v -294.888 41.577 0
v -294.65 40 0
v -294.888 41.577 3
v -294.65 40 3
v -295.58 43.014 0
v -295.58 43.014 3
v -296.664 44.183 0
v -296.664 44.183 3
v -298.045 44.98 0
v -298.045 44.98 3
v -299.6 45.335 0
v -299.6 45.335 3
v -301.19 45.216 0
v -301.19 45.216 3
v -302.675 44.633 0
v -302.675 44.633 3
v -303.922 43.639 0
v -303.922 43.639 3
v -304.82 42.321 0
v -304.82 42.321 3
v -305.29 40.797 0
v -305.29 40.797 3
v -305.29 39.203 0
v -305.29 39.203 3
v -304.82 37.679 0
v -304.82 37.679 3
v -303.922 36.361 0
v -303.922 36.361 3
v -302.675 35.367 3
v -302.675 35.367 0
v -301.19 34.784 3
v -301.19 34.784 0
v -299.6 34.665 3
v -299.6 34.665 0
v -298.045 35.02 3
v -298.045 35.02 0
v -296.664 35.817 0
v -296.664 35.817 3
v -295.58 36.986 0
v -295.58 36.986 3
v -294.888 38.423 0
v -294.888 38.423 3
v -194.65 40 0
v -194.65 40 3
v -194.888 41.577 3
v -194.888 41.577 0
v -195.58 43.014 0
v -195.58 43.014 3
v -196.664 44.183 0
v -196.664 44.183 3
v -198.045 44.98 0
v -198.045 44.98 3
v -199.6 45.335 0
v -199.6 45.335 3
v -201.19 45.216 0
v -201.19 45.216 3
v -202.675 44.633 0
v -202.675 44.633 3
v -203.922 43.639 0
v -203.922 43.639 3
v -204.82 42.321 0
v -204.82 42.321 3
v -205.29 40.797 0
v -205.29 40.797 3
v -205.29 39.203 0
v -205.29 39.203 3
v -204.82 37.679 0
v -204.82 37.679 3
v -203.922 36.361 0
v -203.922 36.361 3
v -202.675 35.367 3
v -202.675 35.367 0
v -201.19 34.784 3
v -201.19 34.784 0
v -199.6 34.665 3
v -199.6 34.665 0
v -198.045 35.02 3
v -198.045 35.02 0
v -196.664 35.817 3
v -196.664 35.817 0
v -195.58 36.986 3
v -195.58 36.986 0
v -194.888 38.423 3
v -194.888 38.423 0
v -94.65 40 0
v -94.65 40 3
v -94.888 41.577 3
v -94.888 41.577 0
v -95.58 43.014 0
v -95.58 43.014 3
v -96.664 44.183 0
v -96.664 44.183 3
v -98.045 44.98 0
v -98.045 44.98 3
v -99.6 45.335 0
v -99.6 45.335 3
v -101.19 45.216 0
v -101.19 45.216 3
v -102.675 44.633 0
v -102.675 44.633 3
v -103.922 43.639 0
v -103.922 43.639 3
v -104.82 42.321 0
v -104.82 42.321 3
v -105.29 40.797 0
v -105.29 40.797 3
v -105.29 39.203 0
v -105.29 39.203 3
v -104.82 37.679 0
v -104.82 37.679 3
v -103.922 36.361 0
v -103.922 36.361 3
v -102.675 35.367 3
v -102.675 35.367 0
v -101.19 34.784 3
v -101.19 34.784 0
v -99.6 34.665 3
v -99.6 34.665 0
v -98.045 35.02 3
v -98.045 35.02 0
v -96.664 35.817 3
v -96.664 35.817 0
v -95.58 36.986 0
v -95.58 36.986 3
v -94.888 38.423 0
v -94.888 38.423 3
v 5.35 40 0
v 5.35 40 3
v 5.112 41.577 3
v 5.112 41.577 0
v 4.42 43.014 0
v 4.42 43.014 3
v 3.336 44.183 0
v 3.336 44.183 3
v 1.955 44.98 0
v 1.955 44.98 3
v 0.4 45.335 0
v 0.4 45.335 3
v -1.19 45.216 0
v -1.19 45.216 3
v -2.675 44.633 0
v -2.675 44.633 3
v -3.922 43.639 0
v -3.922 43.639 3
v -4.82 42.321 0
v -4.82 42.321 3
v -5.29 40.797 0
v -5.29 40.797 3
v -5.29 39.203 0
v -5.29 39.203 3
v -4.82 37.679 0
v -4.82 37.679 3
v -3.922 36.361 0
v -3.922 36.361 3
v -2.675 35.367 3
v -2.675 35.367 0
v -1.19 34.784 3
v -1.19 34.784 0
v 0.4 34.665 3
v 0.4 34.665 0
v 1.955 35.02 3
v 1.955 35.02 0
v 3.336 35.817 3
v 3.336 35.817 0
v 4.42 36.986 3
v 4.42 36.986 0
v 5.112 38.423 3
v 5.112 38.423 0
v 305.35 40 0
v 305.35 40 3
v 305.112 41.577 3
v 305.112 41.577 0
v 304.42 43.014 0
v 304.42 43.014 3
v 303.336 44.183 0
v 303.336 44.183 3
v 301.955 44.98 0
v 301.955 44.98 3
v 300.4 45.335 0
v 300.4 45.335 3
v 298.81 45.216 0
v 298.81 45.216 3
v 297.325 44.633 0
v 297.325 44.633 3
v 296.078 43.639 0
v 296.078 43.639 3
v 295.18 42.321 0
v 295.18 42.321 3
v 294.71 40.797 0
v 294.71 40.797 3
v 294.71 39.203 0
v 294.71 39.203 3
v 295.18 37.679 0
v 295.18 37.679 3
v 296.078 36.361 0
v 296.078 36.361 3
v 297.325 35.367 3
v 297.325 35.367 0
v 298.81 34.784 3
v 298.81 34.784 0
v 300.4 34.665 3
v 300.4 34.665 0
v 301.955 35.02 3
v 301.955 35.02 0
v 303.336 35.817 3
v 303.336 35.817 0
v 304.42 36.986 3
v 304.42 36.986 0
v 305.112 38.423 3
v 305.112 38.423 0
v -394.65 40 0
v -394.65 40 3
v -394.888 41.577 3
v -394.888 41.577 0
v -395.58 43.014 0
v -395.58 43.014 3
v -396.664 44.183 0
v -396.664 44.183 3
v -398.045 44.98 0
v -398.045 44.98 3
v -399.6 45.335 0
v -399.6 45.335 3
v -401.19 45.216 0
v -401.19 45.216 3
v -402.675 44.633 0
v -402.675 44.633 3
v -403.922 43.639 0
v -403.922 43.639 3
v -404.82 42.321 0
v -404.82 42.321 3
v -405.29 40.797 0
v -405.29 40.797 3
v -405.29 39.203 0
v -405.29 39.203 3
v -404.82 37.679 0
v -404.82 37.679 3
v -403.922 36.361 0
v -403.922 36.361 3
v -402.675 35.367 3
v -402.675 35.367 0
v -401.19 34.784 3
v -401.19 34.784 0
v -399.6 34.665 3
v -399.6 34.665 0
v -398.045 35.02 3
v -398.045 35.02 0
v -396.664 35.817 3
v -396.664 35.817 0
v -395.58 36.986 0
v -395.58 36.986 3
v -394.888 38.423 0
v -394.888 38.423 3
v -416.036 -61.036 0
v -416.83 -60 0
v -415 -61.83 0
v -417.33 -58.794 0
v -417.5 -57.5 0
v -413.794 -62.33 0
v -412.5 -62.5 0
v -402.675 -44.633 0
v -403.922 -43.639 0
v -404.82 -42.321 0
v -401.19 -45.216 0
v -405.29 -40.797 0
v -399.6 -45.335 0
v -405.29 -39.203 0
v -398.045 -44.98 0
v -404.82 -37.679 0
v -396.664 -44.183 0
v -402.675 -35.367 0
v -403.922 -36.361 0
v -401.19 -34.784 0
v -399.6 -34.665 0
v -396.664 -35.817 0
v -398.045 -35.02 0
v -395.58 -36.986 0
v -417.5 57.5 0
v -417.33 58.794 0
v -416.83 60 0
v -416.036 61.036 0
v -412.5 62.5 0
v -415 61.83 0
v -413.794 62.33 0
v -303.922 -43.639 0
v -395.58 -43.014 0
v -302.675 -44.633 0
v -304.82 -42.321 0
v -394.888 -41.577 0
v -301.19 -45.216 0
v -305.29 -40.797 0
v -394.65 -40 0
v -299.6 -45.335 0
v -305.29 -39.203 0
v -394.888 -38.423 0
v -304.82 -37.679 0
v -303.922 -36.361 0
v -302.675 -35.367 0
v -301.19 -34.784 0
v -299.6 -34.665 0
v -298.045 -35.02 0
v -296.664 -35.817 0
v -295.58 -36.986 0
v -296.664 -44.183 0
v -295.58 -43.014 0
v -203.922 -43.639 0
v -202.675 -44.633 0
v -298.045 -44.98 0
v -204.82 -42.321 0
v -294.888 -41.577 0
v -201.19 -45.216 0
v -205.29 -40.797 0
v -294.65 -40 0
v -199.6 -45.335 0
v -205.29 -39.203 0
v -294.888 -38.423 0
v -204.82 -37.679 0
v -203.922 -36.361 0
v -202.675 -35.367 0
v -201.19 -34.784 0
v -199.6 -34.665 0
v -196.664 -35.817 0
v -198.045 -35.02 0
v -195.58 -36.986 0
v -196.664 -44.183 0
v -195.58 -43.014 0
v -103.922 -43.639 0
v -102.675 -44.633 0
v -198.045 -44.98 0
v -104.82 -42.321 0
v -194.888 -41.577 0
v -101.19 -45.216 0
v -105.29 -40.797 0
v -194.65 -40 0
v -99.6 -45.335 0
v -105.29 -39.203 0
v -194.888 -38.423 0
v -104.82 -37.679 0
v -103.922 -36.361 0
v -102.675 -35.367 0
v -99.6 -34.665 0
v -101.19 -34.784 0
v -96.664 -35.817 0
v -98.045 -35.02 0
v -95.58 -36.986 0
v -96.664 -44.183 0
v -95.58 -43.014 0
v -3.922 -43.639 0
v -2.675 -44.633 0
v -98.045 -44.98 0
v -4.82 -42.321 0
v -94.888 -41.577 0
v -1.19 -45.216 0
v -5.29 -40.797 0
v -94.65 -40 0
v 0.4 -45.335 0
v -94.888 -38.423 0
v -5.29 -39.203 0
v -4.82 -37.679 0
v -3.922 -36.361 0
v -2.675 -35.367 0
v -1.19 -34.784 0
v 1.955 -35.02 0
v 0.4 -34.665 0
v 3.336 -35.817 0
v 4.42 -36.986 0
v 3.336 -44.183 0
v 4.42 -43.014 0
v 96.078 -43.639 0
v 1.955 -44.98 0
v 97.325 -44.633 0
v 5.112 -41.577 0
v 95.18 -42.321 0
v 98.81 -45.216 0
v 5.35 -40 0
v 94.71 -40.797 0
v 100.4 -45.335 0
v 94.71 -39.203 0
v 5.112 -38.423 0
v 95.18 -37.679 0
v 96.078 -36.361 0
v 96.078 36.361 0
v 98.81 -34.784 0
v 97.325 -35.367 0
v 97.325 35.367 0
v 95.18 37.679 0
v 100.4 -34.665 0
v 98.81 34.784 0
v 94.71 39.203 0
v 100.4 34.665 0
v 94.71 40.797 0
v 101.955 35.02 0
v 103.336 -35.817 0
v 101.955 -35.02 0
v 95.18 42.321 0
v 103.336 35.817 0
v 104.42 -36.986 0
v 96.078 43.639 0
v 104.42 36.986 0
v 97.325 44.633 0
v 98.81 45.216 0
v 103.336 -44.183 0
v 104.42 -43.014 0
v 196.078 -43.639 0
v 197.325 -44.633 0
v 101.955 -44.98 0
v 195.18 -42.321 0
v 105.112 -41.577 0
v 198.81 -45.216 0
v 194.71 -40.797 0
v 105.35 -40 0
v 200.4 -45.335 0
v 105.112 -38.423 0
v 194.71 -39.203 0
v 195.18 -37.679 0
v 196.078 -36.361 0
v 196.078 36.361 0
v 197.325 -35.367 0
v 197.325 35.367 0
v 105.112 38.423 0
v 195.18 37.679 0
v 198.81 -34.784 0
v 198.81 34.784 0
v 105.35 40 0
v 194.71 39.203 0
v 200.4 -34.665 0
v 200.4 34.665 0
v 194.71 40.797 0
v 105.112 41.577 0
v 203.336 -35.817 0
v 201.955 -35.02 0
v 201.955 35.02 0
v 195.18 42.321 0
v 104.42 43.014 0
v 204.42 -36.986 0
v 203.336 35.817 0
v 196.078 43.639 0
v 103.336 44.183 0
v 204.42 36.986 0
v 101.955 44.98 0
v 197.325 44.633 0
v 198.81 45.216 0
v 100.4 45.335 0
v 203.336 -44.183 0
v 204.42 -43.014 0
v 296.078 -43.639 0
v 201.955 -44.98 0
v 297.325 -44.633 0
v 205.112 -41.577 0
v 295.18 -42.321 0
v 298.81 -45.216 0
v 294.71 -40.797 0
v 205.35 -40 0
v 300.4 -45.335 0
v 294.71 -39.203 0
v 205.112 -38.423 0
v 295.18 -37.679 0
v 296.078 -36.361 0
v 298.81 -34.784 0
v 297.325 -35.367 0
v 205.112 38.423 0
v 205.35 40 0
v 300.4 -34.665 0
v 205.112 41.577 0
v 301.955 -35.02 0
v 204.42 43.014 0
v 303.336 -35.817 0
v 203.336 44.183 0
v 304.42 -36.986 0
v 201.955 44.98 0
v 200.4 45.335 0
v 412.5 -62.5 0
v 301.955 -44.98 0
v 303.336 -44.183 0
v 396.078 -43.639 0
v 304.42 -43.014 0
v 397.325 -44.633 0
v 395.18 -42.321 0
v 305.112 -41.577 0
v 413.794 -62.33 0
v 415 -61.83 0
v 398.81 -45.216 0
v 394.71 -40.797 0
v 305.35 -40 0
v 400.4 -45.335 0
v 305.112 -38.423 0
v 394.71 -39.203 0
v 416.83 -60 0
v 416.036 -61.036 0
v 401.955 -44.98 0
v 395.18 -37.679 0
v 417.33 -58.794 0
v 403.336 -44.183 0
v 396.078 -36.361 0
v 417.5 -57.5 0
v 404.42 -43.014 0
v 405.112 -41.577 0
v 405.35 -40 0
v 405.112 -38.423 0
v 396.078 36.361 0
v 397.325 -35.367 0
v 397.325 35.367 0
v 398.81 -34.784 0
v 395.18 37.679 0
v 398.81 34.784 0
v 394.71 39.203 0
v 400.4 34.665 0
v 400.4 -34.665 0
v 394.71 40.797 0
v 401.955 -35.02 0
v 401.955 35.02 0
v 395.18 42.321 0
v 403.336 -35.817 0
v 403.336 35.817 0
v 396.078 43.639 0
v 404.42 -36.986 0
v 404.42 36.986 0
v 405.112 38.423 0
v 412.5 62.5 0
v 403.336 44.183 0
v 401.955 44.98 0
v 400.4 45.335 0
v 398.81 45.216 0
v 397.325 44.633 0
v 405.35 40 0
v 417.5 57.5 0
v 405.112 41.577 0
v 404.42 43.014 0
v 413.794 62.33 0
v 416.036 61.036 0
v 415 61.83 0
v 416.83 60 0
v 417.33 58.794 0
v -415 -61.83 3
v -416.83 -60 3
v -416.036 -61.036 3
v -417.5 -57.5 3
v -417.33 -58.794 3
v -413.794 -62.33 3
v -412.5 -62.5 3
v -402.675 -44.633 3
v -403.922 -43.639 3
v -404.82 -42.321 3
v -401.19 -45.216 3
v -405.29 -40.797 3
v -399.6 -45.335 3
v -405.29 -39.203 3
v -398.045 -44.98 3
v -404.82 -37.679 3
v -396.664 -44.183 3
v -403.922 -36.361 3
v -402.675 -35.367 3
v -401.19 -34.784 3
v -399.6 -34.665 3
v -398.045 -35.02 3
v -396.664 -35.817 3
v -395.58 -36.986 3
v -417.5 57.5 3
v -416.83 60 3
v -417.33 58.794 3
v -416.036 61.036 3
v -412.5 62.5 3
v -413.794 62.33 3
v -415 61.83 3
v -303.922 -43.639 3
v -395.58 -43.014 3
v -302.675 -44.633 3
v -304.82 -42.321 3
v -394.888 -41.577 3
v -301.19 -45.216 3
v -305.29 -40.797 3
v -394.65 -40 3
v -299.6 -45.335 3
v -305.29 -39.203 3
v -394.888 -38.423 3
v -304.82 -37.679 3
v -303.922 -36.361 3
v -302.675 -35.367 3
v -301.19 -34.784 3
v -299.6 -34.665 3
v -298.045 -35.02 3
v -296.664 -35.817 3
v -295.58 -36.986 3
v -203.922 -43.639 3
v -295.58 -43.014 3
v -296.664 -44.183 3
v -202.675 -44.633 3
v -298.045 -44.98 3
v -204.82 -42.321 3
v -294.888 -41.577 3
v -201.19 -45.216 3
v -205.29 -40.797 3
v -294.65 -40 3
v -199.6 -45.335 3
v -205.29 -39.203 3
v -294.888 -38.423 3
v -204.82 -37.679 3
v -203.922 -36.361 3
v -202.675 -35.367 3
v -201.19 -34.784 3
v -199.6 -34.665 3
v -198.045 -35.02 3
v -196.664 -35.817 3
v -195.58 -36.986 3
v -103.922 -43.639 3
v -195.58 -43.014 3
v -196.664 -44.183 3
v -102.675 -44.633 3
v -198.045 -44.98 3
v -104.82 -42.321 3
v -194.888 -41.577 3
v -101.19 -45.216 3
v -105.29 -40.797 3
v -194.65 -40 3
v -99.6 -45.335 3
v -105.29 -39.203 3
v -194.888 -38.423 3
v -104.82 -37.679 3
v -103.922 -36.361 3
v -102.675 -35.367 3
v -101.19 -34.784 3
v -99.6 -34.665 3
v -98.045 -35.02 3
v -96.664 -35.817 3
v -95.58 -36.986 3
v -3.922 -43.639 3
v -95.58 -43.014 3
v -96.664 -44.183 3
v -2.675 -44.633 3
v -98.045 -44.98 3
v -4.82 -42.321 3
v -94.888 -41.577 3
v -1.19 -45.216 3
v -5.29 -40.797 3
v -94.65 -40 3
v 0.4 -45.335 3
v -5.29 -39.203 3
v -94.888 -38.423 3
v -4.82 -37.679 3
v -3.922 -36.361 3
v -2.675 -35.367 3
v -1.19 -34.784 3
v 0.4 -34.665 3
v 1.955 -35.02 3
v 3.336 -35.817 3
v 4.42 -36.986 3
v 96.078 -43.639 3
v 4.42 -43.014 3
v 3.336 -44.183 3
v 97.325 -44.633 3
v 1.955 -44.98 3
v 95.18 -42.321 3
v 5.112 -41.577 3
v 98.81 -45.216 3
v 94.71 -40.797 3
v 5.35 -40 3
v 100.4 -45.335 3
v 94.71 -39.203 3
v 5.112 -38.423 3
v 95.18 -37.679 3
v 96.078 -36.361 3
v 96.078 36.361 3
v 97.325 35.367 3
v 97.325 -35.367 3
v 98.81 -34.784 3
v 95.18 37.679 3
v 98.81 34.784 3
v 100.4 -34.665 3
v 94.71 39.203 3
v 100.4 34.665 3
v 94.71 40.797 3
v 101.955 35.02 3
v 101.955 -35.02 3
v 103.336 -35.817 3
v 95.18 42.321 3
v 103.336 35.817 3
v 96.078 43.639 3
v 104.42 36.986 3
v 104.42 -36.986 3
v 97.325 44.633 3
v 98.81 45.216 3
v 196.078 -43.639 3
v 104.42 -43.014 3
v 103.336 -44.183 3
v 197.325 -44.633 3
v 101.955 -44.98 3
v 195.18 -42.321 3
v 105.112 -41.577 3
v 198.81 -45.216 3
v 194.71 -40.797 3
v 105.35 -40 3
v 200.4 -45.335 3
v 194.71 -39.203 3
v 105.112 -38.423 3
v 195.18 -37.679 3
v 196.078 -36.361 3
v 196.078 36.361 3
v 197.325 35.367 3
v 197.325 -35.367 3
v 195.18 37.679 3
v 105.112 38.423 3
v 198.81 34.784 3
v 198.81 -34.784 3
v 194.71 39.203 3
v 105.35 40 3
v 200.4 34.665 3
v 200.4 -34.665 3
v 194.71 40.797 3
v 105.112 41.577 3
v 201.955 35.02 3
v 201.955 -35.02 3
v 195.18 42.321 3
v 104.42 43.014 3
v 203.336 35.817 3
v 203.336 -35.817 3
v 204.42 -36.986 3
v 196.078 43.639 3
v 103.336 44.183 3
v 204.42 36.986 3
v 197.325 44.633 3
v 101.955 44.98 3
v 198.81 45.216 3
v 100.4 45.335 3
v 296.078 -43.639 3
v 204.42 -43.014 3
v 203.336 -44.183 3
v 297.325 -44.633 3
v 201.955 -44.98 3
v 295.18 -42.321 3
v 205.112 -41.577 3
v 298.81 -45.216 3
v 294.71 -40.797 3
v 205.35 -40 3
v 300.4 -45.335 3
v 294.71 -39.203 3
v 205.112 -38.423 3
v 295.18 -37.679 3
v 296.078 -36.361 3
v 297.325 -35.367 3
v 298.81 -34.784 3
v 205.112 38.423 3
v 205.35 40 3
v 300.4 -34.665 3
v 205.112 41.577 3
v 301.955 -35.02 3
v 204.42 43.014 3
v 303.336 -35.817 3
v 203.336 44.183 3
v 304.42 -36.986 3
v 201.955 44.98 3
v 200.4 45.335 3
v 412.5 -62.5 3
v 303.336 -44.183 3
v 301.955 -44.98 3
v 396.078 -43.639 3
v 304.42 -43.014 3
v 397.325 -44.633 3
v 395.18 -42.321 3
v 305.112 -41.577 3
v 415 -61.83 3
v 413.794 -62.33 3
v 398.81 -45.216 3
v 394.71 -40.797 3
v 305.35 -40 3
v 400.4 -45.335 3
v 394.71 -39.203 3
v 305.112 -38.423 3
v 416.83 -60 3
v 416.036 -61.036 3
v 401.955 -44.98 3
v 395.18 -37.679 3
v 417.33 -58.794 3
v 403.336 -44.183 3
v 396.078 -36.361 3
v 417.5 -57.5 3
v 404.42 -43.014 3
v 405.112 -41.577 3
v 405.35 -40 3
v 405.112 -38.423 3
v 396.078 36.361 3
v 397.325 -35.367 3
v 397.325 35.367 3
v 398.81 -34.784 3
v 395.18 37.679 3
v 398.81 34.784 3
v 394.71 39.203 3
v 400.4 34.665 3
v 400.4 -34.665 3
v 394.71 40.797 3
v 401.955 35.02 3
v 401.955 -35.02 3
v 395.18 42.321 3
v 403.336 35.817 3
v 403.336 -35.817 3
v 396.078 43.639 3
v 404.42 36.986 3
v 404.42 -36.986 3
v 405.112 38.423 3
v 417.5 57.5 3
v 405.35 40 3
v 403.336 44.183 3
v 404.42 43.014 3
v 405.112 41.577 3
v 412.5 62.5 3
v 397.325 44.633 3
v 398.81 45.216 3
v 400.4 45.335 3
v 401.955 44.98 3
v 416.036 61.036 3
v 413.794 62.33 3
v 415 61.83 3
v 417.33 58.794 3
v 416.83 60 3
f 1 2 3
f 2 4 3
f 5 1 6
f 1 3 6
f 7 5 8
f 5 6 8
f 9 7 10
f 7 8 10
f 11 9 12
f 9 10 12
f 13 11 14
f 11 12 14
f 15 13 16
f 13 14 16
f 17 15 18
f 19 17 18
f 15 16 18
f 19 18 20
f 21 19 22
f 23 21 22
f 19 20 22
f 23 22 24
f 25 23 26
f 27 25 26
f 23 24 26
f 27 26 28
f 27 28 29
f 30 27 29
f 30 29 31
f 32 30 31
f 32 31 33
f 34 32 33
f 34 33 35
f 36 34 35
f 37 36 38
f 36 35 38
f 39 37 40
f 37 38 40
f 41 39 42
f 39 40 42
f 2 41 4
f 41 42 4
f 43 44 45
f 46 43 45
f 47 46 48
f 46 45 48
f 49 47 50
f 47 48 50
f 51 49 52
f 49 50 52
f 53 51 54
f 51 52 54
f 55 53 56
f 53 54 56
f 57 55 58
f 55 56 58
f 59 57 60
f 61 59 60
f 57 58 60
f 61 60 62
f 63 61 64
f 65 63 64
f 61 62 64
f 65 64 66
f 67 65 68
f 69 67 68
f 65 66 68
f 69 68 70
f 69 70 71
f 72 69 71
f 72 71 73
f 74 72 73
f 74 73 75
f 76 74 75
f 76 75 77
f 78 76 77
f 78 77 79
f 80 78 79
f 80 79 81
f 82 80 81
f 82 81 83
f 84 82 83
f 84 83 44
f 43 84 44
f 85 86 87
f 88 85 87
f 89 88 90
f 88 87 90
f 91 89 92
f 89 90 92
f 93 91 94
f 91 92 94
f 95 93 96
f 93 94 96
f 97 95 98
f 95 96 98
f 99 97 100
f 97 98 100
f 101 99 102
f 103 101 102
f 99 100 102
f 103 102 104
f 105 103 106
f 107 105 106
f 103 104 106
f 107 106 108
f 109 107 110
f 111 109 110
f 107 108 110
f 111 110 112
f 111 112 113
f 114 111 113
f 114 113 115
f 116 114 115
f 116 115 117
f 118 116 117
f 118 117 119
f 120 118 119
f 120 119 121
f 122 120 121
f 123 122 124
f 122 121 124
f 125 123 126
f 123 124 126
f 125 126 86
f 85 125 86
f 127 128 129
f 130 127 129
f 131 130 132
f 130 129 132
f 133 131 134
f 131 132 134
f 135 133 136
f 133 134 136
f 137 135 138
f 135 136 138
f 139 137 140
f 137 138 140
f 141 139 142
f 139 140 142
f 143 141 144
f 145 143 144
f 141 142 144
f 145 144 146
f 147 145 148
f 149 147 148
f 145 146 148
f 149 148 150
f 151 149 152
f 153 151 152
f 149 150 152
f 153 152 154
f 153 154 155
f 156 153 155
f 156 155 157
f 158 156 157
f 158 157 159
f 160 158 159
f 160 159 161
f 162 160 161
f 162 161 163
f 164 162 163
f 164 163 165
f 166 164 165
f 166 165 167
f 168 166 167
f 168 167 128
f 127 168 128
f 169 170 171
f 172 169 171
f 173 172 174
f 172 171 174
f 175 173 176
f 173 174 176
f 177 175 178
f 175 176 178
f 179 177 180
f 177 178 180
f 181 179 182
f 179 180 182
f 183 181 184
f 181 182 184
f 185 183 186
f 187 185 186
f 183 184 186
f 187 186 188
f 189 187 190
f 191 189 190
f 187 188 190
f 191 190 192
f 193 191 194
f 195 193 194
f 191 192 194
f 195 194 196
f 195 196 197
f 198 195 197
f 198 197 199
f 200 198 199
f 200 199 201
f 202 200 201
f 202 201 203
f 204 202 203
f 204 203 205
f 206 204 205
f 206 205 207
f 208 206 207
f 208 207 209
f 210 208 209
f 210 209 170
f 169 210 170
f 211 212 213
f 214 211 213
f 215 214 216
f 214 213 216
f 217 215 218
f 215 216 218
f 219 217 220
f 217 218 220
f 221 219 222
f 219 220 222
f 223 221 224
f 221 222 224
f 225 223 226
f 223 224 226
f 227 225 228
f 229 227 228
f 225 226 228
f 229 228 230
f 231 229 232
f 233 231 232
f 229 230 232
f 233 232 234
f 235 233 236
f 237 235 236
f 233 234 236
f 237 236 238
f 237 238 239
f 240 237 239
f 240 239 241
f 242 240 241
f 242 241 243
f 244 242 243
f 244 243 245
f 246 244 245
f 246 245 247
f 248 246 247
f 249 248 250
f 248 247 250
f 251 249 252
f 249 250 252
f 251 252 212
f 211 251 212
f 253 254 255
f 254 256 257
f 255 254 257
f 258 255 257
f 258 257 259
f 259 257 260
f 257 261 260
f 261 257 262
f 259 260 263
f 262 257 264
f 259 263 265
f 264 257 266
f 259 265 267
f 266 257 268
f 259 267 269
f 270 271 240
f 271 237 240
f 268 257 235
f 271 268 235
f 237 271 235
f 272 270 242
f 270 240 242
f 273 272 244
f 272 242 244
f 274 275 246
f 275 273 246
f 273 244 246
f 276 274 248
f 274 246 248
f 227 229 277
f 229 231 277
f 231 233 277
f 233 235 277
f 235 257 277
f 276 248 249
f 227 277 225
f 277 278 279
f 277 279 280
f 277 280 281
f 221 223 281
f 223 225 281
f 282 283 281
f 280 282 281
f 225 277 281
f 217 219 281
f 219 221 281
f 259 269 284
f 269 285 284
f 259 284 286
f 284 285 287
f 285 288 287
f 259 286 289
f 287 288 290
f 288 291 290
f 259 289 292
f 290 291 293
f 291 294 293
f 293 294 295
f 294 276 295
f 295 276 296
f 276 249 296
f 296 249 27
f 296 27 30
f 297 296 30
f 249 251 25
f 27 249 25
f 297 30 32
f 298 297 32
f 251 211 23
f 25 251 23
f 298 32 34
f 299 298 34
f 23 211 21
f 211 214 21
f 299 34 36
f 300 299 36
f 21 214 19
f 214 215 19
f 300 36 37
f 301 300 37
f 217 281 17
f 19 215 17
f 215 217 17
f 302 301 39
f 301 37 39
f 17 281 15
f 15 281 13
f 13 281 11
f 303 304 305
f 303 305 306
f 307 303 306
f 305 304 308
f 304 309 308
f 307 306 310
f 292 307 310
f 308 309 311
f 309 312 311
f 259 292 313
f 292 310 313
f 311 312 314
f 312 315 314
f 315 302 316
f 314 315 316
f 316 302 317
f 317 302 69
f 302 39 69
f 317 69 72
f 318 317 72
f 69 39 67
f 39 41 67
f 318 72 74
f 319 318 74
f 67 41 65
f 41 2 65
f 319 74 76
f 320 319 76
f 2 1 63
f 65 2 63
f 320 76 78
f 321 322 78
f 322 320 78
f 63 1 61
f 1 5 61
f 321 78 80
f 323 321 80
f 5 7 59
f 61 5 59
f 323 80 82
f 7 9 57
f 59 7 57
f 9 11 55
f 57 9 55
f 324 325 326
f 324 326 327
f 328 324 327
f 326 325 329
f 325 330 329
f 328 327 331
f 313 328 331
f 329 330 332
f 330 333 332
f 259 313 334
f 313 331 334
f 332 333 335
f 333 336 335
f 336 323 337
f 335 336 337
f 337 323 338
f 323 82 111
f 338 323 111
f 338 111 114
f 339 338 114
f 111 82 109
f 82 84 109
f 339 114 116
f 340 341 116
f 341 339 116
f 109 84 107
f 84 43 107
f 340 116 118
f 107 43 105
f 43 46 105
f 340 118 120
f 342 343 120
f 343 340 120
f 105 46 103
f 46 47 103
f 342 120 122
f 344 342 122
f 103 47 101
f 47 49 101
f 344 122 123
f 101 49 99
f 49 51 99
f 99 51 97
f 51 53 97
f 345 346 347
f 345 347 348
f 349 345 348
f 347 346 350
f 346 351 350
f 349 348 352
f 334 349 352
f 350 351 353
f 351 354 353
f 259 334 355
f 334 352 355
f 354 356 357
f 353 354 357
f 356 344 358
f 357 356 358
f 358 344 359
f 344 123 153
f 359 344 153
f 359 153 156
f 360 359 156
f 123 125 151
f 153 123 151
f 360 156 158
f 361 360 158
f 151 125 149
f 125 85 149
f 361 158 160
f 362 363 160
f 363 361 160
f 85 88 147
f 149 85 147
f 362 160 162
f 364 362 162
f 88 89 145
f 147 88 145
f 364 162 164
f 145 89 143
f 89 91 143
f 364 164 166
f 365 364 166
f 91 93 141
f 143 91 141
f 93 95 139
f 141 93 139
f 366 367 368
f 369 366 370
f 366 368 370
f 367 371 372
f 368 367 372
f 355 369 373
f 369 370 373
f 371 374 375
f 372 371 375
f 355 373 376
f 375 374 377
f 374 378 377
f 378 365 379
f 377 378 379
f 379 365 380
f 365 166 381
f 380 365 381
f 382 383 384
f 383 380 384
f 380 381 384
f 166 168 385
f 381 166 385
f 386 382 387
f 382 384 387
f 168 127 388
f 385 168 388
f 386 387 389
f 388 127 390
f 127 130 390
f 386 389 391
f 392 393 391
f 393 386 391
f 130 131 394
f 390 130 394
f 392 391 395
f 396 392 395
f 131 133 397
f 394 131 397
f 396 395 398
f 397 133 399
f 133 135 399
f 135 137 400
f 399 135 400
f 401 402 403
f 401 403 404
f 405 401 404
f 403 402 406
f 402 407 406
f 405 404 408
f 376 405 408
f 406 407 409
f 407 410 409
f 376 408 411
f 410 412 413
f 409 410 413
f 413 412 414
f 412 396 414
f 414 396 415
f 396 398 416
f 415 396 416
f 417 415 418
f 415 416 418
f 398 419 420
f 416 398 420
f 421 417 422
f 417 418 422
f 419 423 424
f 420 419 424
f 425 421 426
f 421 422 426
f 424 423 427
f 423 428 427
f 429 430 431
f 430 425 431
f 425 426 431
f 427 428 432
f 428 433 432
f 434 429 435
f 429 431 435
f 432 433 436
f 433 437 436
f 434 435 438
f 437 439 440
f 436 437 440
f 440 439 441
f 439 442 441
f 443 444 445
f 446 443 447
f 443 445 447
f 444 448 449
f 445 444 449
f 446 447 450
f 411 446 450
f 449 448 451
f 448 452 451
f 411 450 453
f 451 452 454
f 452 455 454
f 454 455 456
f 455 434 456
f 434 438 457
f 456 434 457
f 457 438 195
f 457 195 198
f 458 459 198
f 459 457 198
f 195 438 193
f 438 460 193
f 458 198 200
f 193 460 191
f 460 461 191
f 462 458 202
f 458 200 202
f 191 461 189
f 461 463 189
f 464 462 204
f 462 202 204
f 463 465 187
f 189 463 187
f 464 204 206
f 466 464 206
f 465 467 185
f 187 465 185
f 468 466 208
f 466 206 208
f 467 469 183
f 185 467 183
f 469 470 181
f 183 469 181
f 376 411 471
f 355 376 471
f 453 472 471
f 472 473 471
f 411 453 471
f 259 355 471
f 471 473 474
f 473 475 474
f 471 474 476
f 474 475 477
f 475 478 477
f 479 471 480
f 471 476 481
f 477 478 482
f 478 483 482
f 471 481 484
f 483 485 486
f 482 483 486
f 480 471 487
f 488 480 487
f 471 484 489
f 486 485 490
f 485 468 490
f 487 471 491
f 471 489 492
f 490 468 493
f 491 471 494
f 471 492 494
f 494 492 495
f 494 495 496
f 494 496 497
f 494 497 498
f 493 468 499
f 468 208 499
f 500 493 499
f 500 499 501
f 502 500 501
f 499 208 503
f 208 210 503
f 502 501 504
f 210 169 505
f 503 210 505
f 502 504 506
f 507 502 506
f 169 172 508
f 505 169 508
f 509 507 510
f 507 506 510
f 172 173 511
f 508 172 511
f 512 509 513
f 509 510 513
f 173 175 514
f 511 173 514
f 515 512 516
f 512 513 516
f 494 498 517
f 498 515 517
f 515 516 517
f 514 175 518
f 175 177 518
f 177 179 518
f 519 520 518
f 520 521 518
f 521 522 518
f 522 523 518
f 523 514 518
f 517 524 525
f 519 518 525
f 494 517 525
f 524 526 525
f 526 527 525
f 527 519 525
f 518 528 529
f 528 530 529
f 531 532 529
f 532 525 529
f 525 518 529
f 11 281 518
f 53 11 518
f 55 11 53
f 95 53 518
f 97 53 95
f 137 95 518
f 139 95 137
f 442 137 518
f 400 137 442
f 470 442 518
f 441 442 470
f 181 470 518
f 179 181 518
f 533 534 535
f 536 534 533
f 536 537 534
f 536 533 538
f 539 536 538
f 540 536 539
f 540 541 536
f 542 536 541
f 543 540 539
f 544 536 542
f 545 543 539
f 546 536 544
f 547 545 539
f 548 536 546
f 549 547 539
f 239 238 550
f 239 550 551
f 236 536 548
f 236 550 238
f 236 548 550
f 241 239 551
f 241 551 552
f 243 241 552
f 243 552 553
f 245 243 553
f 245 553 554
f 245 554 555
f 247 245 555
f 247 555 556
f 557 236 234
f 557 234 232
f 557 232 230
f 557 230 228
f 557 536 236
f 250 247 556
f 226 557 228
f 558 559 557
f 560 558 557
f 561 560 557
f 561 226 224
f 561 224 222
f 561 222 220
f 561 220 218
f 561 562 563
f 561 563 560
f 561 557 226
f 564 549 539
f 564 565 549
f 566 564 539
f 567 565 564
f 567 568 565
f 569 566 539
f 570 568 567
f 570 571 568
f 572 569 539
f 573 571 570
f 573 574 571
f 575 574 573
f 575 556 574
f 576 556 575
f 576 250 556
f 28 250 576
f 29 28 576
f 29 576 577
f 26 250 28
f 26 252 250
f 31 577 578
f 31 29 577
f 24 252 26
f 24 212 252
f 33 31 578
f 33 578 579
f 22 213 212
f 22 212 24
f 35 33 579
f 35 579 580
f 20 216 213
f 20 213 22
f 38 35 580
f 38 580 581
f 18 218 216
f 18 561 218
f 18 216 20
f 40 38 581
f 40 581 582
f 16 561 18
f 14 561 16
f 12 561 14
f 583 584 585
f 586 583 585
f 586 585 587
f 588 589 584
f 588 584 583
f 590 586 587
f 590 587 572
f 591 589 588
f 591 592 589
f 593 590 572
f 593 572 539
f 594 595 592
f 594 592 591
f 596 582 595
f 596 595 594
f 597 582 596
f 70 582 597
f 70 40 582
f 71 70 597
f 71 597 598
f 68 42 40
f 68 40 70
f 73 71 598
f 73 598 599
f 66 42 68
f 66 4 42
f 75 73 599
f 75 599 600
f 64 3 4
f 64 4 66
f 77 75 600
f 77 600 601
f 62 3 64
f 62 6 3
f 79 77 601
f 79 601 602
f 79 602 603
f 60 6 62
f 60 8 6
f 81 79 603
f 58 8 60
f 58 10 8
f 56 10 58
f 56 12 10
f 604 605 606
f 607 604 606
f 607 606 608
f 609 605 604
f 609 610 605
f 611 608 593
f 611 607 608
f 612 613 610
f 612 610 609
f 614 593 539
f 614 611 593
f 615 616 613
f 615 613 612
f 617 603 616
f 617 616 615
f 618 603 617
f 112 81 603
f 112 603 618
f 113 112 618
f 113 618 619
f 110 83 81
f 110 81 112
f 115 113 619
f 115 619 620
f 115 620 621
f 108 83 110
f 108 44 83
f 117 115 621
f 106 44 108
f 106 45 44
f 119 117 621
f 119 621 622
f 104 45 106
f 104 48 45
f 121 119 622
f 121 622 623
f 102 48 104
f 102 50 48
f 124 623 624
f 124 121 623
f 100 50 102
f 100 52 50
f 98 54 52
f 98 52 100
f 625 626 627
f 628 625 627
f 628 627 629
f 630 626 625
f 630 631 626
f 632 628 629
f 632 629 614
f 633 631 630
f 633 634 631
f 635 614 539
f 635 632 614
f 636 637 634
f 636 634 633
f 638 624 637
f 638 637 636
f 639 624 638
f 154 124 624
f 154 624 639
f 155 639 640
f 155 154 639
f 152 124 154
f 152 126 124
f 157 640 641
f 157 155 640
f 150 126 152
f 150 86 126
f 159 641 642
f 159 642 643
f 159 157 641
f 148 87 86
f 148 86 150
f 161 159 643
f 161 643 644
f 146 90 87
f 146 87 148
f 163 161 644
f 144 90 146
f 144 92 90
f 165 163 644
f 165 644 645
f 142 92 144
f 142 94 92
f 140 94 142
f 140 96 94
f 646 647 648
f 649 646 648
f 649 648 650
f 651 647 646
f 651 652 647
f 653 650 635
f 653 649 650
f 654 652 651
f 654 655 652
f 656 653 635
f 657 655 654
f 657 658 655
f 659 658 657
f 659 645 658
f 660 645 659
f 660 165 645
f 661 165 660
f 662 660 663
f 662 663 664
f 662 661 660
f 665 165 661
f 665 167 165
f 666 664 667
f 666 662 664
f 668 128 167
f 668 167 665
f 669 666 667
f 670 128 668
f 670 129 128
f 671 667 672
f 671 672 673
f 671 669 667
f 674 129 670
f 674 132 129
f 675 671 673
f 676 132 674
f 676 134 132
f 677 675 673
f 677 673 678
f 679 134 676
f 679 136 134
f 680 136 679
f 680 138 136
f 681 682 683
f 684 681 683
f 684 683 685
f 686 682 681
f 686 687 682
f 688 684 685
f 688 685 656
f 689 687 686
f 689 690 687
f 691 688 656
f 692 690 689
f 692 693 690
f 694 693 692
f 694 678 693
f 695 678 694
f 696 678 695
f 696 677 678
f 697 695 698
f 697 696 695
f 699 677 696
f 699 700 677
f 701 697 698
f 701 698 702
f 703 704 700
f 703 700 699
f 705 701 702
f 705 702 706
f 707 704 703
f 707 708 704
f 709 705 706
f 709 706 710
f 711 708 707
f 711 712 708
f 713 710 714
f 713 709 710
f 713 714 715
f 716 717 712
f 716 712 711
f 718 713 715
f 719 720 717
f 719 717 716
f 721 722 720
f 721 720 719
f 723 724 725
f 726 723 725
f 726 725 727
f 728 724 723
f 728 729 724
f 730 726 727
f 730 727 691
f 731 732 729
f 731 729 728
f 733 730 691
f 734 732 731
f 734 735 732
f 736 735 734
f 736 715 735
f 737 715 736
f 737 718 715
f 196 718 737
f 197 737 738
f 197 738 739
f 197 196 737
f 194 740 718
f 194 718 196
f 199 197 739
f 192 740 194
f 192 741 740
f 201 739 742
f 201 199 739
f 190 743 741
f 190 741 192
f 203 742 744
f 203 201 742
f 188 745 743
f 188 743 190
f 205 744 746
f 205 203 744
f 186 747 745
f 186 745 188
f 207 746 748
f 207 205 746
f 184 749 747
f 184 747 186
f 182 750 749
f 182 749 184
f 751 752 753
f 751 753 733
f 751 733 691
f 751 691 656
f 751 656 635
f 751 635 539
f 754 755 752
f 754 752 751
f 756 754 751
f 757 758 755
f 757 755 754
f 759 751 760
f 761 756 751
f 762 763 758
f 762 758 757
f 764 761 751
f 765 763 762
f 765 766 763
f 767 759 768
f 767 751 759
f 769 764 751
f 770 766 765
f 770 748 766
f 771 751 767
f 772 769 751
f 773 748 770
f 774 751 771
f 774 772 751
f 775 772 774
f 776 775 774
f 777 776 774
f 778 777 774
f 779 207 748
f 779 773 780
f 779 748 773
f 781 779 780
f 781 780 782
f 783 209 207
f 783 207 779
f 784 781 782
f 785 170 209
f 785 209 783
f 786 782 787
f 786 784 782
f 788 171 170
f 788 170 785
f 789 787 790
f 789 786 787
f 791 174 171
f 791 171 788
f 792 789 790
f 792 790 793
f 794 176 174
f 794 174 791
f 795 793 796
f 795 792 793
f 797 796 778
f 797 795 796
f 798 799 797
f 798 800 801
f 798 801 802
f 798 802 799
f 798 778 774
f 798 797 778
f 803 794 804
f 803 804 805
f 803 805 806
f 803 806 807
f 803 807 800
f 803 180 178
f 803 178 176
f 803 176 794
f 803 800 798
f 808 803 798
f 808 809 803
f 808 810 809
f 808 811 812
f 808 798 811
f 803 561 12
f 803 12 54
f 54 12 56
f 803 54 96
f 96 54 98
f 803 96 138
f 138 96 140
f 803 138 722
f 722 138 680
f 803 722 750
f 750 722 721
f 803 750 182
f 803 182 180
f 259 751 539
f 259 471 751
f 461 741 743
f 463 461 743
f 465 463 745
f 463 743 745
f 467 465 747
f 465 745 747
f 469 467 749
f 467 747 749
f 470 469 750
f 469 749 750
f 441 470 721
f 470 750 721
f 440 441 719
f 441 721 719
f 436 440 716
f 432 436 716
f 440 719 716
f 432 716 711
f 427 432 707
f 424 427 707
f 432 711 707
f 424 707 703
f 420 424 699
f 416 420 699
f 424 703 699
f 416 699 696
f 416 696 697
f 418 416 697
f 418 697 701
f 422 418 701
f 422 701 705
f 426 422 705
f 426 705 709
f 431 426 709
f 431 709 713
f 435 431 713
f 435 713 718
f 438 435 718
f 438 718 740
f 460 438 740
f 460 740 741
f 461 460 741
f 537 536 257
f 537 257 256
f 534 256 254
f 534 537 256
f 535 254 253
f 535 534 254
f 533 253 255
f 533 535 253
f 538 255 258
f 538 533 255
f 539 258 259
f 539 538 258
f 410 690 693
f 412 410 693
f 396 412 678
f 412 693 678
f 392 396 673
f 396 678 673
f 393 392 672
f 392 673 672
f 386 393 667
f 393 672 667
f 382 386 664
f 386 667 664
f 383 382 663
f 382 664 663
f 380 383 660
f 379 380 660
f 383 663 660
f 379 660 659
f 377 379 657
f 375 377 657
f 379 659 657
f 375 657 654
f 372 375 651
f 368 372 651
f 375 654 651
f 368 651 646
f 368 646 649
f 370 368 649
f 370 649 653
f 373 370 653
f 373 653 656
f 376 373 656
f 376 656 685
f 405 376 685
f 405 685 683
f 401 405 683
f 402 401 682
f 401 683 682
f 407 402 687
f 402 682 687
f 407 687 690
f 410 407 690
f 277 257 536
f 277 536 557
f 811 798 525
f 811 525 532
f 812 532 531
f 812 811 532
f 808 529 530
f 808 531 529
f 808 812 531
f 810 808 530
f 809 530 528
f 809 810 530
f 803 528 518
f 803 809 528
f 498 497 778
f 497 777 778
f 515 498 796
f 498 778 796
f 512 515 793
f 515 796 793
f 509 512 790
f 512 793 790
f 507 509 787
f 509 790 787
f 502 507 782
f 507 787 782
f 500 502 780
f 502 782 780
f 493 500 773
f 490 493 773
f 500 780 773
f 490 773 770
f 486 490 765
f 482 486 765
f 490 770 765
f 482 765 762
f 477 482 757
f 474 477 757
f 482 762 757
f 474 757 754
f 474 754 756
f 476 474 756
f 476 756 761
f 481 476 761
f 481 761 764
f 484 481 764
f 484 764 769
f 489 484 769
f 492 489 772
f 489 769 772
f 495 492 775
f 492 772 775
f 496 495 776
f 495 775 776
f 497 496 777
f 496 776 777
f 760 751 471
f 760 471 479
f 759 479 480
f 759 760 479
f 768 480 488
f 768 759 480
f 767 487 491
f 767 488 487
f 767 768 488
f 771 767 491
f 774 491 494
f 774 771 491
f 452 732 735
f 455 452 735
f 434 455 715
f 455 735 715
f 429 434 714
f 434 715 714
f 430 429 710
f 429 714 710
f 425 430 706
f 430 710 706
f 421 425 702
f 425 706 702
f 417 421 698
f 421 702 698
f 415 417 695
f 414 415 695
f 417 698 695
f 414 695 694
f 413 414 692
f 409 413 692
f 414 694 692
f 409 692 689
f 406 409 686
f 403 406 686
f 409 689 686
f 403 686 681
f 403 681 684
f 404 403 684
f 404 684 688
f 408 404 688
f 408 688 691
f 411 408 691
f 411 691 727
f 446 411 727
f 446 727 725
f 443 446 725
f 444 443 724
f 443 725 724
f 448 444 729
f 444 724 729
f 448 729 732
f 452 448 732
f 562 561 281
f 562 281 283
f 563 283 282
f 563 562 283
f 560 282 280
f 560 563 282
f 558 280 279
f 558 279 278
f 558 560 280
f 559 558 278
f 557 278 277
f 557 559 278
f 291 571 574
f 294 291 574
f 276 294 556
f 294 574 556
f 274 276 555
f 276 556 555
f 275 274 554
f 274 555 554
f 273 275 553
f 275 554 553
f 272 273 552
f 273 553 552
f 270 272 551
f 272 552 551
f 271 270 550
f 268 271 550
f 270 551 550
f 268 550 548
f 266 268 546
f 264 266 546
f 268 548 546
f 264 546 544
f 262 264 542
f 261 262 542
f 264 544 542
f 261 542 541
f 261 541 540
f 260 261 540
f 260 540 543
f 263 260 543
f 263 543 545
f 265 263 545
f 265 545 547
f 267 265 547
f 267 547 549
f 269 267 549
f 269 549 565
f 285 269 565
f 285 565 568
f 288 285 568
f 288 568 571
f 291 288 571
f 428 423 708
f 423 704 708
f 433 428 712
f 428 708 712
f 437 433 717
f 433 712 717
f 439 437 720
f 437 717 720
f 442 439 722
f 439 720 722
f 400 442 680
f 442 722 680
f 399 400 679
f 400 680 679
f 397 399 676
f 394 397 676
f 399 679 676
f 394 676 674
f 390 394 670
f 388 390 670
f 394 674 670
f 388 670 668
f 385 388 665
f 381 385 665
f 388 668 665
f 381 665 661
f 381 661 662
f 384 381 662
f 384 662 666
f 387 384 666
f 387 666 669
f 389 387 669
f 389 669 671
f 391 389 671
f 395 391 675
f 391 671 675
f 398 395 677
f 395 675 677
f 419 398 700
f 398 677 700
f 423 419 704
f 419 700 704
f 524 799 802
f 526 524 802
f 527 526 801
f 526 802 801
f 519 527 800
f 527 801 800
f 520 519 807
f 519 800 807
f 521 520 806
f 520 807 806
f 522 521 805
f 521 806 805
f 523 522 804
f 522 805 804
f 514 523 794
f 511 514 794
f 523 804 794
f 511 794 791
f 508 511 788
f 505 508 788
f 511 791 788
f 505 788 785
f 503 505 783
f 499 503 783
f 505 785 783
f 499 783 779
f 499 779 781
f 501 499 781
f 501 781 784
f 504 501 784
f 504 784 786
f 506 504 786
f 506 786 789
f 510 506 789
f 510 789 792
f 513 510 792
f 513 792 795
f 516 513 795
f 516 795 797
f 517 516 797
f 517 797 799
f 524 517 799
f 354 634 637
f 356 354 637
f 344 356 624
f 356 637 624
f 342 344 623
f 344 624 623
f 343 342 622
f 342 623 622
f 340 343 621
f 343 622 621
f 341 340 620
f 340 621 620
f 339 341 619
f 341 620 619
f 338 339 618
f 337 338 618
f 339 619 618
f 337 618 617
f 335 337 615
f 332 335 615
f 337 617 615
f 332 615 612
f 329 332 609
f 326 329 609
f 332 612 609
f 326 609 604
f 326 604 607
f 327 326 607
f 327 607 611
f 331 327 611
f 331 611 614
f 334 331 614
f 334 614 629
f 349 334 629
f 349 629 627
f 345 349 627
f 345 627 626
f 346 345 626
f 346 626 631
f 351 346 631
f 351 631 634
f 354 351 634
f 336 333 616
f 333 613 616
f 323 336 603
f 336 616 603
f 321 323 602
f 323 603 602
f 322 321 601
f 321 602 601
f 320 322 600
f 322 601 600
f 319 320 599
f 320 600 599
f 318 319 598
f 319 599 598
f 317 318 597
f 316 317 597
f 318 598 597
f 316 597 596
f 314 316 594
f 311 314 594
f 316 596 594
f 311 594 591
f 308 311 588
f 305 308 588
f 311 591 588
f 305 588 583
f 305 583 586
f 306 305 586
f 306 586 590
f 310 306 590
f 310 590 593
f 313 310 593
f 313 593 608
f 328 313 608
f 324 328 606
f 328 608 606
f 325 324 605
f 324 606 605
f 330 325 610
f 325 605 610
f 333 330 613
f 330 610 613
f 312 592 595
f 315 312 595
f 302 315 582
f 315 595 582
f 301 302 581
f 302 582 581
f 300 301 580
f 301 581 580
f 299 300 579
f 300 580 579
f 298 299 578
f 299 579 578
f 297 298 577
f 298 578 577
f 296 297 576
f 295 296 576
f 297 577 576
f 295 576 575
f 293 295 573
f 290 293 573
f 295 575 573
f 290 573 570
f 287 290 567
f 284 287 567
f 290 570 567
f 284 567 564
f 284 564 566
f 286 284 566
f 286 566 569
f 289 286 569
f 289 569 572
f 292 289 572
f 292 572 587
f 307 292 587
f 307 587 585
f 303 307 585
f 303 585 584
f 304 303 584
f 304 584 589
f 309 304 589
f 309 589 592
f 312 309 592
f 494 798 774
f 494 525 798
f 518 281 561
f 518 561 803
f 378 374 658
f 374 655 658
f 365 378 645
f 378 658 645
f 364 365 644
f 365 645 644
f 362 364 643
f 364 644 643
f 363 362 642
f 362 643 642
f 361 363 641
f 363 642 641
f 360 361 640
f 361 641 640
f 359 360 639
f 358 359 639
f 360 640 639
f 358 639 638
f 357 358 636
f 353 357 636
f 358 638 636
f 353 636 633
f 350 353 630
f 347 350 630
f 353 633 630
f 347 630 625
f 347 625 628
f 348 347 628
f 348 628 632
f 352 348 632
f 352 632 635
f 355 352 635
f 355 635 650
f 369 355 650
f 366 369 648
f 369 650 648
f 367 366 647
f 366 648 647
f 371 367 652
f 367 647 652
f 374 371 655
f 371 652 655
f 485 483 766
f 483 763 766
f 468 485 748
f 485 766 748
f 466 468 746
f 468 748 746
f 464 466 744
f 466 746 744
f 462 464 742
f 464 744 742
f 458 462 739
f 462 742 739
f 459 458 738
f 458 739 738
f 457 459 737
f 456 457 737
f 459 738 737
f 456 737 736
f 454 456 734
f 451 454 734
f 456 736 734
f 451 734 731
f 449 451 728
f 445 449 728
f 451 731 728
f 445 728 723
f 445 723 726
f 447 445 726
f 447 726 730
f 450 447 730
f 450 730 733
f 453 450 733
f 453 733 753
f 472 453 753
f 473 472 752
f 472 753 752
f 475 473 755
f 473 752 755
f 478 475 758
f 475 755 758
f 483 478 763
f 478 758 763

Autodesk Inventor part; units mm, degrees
ref_plane "YZ Plane" through (0, 0, 0) normal (1, 0, 0) x (0, 1, 0)
ref_plane "XZ Plane" through (0, 0, 0) normal (0, 1, 0) x (-1, 0, 0)
ref_plane "XY Plane" through (0, 0, 0) normal (0, 0, 1) x (1, 0, 0)
sketch "Sketch1" plane through (0, 0, 0) normal (0, 0, 1) x (1, 0, 0)
  line L0 (-417.5, 62.5) -> (417.5, 62.5)
  line L1 (417.5, 62.5) -> (417.5, -62.5)
  line L2 (417.5, -62.5) -> (-417.5, -62.5)
  line L3 (-417.5, -62.5) -> (-417.5, 62.5)
  line L4 (-417.5, 62.5) -> (417.5, -62.5) construction
  line L5 (417.5, 62.5) -> (-417.5, -62.5) construction
  point P0 (0, 0)
  dimension "d0" = 125
  dimension "d1" = 835
extrude "Plate1" add sketch "Sketch1" along normal blind 3
sketch "Sketch2" plane through (0, 0, 3) normal (0, 0, 1) x (1, 0, 0)
  circle A0 centre (0, 40) radius 5.35
  circle A1 centre (0, -40) radius 5.35
  line L0 (0, 40) -> (0, -40)
  point P0 (0, 0)
  point P1 (0, 0)
  dimension "d3" = 10.7
  dimension "d4" = 80
extrude "Cut1" cut sketch "Sketch2" against normal blind 3
pattern_linear "Rectangular Pattern1" count 9 spacing 100 along (1, 0, 0) of "Cut1" first direction both ways yes
fillet "Fillet1" radius 5 4 edges at (417.5, -62.5, 1.5) (417.5, 62.5, 1.5) (-417.5, -62.5, 1.5) (-417.5, 62.5, 1.5)
equation "\"d5\" = Thickness"
equation "\"d2\" = Thickness"
equation "\"BendRadius\" = Thickness"
equation "\"BendReliefWidth\" = Thickness"
equation "\"BendReliefDepth\" = 0.5 * Thickness"
equation "\"CornerReliefSize\" = 4 * Thickness"
equation "\"MinimumRemnant\" = 2 * Thickness"
equation "\"TransitionRadius\" = BendRadius"
equation "\"JacobiRadiusSize\" = BendRadius"
equation "\"GapSize\" = Thickness"
equation "\"Thickness\" = 3"
properties part number "IMS-10-002" material "Steel, Carbon"
